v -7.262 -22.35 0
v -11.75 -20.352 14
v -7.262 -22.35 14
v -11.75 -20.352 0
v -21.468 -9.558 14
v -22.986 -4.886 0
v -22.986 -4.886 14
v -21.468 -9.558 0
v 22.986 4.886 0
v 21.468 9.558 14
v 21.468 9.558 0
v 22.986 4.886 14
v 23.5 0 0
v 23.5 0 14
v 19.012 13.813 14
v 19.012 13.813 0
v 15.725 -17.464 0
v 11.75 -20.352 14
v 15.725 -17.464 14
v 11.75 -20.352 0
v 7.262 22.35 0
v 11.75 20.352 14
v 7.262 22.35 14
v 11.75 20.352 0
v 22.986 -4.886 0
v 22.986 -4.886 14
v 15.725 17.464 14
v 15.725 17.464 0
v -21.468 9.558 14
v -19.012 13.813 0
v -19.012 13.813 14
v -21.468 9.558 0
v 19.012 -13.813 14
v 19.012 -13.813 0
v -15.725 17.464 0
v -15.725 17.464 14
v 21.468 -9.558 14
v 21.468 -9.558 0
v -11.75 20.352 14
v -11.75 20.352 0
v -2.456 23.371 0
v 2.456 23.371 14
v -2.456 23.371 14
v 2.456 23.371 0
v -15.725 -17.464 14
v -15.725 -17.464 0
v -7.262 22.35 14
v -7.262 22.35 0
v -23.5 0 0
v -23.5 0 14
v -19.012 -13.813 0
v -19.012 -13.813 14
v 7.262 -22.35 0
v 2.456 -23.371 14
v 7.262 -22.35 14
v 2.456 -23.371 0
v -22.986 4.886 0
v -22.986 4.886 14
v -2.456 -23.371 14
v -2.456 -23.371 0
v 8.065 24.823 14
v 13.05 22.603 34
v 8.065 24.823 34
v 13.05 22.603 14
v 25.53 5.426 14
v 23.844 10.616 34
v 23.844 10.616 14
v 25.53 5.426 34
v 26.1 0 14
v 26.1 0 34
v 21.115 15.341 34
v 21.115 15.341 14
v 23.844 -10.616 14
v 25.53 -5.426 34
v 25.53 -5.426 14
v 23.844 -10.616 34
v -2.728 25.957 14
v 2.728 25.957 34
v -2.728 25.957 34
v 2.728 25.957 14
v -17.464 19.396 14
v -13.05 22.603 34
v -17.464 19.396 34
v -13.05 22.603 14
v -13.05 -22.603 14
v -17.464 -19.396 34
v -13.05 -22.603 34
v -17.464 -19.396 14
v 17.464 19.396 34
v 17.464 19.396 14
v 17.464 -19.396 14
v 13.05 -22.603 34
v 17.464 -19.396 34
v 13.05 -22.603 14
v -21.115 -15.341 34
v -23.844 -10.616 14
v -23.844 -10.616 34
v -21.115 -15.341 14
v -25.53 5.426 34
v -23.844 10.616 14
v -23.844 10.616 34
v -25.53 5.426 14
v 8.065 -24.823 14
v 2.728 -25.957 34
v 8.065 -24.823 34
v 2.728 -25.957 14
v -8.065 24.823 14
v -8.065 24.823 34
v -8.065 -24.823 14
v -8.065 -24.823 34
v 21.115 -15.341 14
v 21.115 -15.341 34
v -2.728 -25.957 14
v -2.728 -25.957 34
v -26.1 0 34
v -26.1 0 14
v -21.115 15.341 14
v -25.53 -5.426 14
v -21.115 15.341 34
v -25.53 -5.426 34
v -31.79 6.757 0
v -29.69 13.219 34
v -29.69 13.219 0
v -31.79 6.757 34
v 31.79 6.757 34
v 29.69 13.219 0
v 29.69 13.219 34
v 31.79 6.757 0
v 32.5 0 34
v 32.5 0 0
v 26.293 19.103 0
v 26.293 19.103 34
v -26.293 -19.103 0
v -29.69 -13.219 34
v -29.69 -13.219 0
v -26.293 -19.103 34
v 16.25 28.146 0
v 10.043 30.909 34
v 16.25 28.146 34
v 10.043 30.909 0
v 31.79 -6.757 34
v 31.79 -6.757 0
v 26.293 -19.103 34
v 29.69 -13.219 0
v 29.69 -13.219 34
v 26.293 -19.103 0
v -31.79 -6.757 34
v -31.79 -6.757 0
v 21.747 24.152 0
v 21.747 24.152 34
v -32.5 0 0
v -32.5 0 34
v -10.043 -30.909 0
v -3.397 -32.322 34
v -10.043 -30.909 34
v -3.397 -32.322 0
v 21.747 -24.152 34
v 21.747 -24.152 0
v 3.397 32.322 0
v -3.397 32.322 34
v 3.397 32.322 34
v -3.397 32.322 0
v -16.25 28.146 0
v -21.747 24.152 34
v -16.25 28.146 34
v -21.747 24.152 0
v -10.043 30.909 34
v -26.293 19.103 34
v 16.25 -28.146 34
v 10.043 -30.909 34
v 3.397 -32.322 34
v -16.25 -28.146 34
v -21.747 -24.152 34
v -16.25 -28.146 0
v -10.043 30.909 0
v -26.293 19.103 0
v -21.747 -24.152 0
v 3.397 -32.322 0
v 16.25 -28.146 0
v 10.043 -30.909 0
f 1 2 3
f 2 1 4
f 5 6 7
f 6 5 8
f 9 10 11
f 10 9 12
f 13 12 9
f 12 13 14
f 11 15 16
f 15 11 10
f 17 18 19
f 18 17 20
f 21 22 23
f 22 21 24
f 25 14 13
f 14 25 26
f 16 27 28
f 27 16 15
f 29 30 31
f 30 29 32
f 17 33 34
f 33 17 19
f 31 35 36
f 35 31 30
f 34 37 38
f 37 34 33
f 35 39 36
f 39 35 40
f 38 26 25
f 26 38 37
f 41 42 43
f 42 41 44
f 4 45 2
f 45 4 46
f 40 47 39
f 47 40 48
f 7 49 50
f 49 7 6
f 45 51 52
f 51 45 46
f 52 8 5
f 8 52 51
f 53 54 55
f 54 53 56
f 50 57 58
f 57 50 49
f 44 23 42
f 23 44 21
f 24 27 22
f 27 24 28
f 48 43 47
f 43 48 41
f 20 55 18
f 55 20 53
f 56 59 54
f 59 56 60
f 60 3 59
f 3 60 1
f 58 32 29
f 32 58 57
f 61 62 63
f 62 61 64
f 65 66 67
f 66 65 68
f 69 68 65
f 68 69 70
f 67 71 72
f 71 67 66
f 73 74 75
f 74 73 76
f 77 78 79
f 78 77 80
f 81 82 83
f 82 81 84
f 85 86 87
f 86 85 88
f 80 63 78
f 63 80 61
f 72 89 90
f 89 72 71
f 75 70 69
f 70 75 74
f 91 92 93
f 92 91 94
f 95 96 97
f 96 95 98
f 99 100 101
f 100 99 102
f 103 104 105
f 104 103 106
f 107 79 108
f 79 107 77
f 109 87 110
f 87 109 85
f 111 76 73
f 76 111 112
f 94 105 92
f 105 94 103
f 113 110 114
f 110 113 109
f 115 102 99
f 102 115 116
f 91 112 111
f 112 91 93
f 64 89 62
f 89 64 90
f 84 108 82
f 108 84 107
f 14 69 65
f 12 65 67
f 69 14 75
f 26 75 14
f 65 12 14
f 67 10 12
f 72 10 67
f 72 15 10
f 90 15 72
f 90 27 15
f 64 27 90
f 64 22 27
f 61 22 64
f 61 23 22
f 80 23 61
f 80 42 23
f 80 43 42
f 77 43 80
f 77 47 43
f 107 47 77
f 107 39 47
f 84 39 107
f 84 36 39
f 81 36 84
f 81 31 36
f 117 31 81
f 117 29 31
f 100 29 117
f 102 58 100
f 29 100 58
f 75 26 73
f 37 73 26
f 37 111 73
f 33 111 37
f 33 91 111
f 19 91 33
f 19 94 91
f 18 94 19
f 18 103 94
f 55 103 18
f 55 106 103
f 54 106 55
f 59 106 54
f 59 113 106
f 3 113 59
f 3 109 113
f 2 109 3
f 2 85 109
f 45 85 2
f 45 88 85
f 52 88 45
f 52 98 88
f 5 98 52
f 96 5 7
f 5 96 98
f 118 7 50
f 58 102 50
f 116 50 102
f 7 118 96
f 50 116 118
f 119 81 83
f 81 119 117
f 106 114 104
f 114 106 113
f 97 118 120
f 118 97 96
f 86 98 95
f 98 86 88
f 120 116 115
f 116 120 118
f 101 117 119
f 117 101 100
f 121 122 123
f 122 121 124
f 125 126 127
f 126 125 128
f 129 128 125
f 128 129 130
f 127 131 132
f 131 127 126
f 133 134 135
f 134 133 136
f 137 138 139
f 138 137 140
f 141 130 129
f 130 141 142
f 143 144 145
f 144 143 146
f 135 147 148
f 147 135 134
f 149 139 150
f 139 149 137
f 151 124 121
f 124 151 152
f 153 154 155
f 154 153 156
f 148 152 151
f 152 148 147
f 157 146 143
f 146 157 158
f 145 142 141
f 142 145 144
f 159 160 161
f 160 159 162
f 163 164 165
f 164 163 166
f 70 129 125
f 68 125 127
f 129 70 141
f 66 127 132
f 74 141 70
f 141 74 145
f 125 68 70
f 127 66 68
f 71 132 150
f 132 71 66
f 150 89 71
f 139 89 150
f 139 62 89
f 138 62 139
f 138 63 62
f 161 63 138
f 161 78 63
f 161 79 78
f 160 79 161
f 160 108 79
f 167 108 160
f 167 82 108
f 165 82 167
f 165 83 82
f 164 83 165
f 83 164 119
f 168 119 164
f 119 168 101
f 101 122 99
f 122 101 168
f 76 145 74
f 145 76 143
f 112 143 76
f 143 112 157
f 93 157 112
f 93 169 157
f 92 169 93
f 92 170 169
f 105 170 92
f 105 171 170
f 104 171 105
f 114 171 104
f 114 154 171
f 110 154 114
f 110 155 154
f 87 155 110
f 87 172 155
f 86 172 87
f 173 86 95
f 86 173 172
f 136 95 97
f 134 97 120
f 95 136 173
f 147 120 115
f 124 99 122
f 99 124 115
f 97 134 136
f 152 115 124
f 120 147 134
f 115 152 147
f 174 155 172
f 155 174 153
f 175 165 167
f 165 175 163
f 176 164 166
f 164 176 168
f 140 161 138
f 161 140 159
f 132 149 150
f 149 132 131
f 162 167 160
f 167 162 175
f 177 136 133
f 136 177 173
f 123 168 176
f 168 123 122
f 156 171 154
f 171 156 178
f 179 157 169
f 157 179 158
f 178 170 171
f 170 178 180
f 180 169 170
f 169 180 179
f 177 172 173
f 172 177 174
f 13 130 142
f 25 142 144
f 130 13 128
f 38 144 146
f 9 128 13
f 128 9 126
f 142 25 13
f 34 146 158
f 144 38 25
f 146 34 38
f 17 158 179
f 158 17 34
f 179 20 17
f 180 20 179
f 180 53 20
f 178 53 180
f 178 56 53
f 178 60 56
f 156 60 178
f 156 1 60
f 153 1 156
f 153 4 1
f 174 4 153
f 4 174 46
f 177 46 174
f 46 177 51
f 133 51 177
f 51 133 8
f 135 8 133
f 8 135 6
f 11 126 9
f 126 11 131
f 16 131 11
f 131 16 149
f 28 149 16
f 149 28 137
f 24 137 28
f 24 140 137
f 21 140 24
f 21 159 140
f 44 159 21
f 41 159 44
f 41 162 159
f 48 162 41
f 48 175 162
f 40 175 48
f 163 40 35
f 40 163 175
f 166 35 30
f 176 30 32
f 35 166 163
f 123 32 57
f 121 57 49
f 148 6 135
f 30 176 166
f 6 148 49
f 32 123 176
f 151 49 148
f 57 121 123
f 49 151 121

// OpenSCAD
// file: verticalShaftHolderPivotPoint.scad
include <parameters/commonParameters.scad>;
include <parameters/verticalShaftHolderParameters.scad>;
// Example part to sit on the verticalShaftHolder
// including holding a roller bearing

// The bottom should be no narrower than thrustBearingMinimumAbutmentDiameter,
// But it can be much bigger.

// The idea is that sits ON the thrust bearing, and holds a roller bearing to minimize friction around the center shaft,
// for times when there is angular stress on the system.

module verticalShaftHolderPivotPoint(outsideDiameter = thrustBearingMinimumAbutmentDiameter, rollerBearingHeightAboveThrustBearing = thrustBearingHeight) {
    difference() {
        // Height and width of this part are minimums.
        echo(rollerBearingHeightAboveThrustBearing + rollerBearingHeight);
        cylinder(h = rollerBearingHeightAboveThrustBearing + rollerBearingHeight, d =
        outsideDiameter);
        union() {
            translate([0, 0, - 1]) // -1 just ensures we clear the bottom and don't leave a 2d "film"
                cylinder(h = 200, d = thrustBearingOuterDiameterShaftWasher);
            translate([0, 0, rollerBearingHeightAboveThrustBearing])
                cylinder(h = 200, d = rollerBearingOutsideDiameter);
        }
    }
}

// Remember that the thrust bearing fits between these two parts,
// In theory one could "encapsulate" it, but remember the top and bottom
// of the thrust washer have the same outside diameter, so you can't "squeeze" it.
// In theory the INSIDE of this part should hold everything in place.

// The only possible "slop" is that the roller ball carrier and the top of the thrust bearing could "rattle" a little, but I think that the groove in the top and bottom pieces
// will center it rapidly.
// Not to mention pinning it relatively tighly will prevent it "poppping out".

// If that is an issue though, we could "capture" or "squeeze" the top "washer"
// of the thrust bearing.

// The MINIMUM outside diameter is thrustBearingMinimumAbutmentDiameter,
// which is the default if no argument is given,
// But to fully use the entire surface of the thrust washer use thrustBearingOutsideDiameter
verticalShaftHolderPivotPoint(outsideDiameter = thrustBearingOutsideDiameter);
// file: modules/legsAroundTheCenterPoint.scad
include <jointModule.scad>;

module legsAroundTheCenterPoint(legCount = 1, legLength = false, includeTriangleSupports = true) {
    legSpacingInDegrees = 360 / legCount;

    // TODO: Triangle parameters should be arguments to the function.
    //       and/or use some fancy math to generate.
    jointLegs = [for (i = [0:legCount - 1]) legInstance(rotation = [0, 90, legSpacingInDegrees * i], insideDiameter =
    horizontalPipeInsideDiameter,
    flatBottom = true, pinHole = true, length = legLength, triangleSupport = includeTriangleSupports ? [15, - 21 + legSpacingInDegrees * i, 50] : false)];
    joint(jointLegs, horizontalPipeInsideDiameter, true);
}
// file: modules/jointModule.scad
// Modules
// legs is a vector of legs,
//      each leg is a vector containing:
//      vector of the joint rotation
// horizontalPipeInsideDiameter
// Optional Boolean requesting addition of a flat bottom
// Optional Boolean or number requesting a hole drilled near the end,
//      If it is a number, this is the angle at which it should be drilled.
//      For historical reasons, 0 and true are equivalent
//      Use false when you need to skip this but still add another vector entry
// Option integer indicating an override for the length of this leg
// i.e. [[x, y, z], horizontalPipeInsideDiameter]

/*
i.e.
jointLegs = [
        [[0, 90, 0], horizontalPipeInsideDiameter, true, true],
        [[90, 90, 0], horizontalPipeInsideDiameter, true, 45],
        [[90, 90, 180], horizontalPipeInsideDiameter, true, 90, 500],
    ];

 */

// This function makes creating the array for the joint module much easier.
// Just name any parameters and skip those you don't care about and defaults will be injected.
// The only REQUIRED paremeter is the insideDiameter, although a suitable default could be added here (instead of 0, so technically it isn't required).
function legInstance(rotation = [0, 0, 0], insideDiameter = 0, flatBottom = false, pinHole = false, length = false,
triangleSupport = false, labelText = false, reverseText = false) = [rotation,
  insideDiameter, flatBottom, pinHole, length, triangleSupport, labelText, reverseText];

// Pinholes have to be further from the ends because the ends are cut off to fit in the print bed.
module joint(legs = [], sphereJointInsideDiameter = 0, closeUpWithSphere = false, addCircleToFlatBottom = false, jointPinHoleOffset = jointPinHoleOffset)
{
  difference()
    {
      // Build
      union() color(JointColor)
        {
          for (leg = legs) {
            thisJointLegLength = len(leg) > 4 && leg[4] != false ? leg[4] : jointLegLength;
            rotate(leg[0])
              cylinder(
              h = thisJointLegLength,
              r = (leg[1] + jointWallThickness * 2) / 2);

            // Add flat bottom
            if (leg[2]) {
              rotate(leg[0])
                translate([
                    (leg[1] / 2) + (jointWallThickness / 2),
                  0,
                    thisJointLegLength / 2
                  ])
                  cube([
                    jointWallThickness,
                    // The 0.5 is a guess at width. A parameter would probably be better.
                      leg[1] * 0.5,
                    thisJointLegLength
                    ],
                  center = true);
            }

            // Triangles for improving stength
            if (len(leg) > 5 && leg[5] != false) {

              // TODO: Document this
              thisTrianglePointA = leg[5][0] ? leg[5][0] : 10;
              thisTriangleRotateZ = leg[5][1] ? leg[5][1] : leg[0][2] * 1.5;
              thisTrianglePointB = leg[5][2] ? leg[5][2] : 40;
              thisTriangleRotatex = leg[5][3] ? leg[5][3] : 90 - leg[0][1];
              thisTriangleRotateY = leg[5][4] ? leg[5][4] : 0;

              rotate([thisTriangleRotatex, thisTriangleRotateY, thisTriangleRotateZ])
                linear_extrude(height = 8, center = true, convexity = 10, twist = 0)
                  polygon(points = [[thisTrianglePointA, thisTrianglePointB], [0, 0], [
                    thisTrianglePointB, thisTrianglePointA]],
                  paths =
                    [[0, 1, 2]]);
            }
          }

          if (closeUpWithSphere)
          // Use a Sphere to close up the gap between the pipes.
          // This is kinda hacky, but it looks good to me and does the job.
            sphere(d = sphereJointInsideDiameter + jointWallThickness * 2);

          if (addCircleToFlatBottom)
          // Add a cylinder at the end of the leg to close any gap between leg flats
          // This also creates a solid floor in case the sphere is so big
          // that the cut below cuts off the bottom of it.
            rotate(legs[0][0])
              rotate([0, 90, 0])
                translate([
                  0,
                  0,
                    legs[0][1] / 2,
                  ])
                  cylinder(h = jointWallThickness, r = (legs[0][1] * 0.5) / 2);

        }

      // Hollow out
      union()
        {
          for (leg = legs) {
            thisJointLegLength = len(leg) > 4 && leg[4] != false ? leg[4] : jointLegLength;
            // The -0.01 ensures that the end of the tube is clear.
            rotate(leg[0]) translate([0, 0, - 0.01]) cylinder(
            h = thisJointLegLength + 0.02, r = leg[1] / 2);

            // IF a flat bottom was added, also add a "cut" to ensure nothing
            // else in the part extends below this flat bottom.
            if (leg[2]) {
              rotate(leg[0])
                translate([
                    (leg[1] / 2) + (jointWallThickness * 2),
                  0,
                    thisJointLegLength / 2
                  ])
                  cube([
                    // The 0.00001 just ensures it doesn't clip the flat on the legs at all.
                        jointWallThickness * 2 - 0.00001,
                      leg[1] * 2,
                      thisJointLegLength * 2
                    ],
                  center = true);
            }
            if (len(leg) > 3 && leg[3] != false) {
              // Make a hole near the end of the leg for pinning
              // The -0.01 ensures that the end of the tube is clear.
              rotate([leg[0][0] + 90, leg[0][1], leg[0][2]])
                translate([0,
                    thisJointLegLength - jointPinHoleOffset, 0])
                  rotate([0, leg[3] == true ? 0 : leg[3],
                    0])
                    cylinder(
                    h = leg[1] + jointWallThickness * 2 + 0.01, d = jointPinningHoleDiameter, center
                    = true);
            }
            // Add text to bottom of a flat leg
            if (len(leg) > 6 && leg[6] != false) {
              rotate([leg[0][0], leg[0][1] + 90, leg[0][2]])
                translate([
                      - thisJointLegLength + jointPinHoleOffset + jointPinningHoleDiameter
                  ,
                  0,
                        sphereJointInsideDiameter / 2 + jointWallThickness - 1
                  ])
                  mirror([0, leg[7] == true ? 1 : 0, 0])
                    linear_extrude(1.1)
                      text(leg[6], size = 5, font = "Liberation Mono", valign = "center", halign =
                      "left");
            }
          }

          if (closeUpWithSphere) {
            // Hollow out the sphere
            sphere(d = sphereJointInsideDiameter);
          }

        }
    }
}
// file: parameters/verticalShaftHolderParameters.scad
// https://paper.dropbox.com/doc/Shaft-Holder-with-Bearings--BPUd0R93dqpLMge3XfPWzi2zAg-a79LjXcU3vrNJJHZMteSG

rollerBearingInsideDiameter = 45; // Same as Thrust Bearing bore diameter
rollerBearingHeight = 20;
rollerBearingOutsideDiameter = 52.2;

thrustBearingOutsideDiameter = 65;
thrustBearingHeight = 14;
thrustBearingOuterDiameterShaftWasher = 47;

thrustBearingMinimumAbutmentDiameter = 57; // This is a MINIMUM

comfortablePinningDiameter = 55; // Could maybe be bigger?
comfortablePinnedSectionHeight = 20; // May need testing
// file: WalkerBody-BoxCornerJoint-withX.scad
// Load in some defaults
include <parameters/commonParameters.scad>;

// Pick what size pipes you are using
horizontalPipeInsideDiameter = horizontalPipeInsideDiameter_0_50pvc;
verticalPipeInsideDiameter = verticalPipeInsideDiameter_0_50pvc;

include <modules/jointModule.scad>;

module BoxCornerJoint()
{
    jointLegs = [
        legInstance(rotation = [0, 90, 0], insideDiameter = horizontalPipeInsideDiameter, flatBottom = true, pinHole =
        true, length = jointLegLength + 25),
        legInstance(rotation = [45, 90, 0], insideDiameter = horizontalPipeInsideDiameter, flatBottom = true, pinHole =
        true, length = jointLegLength + 50),
        legInstance(rotation = [90, 90, 0], insideDiameter = horizontalPipeInsideDiameter, flatBottom = true, pinHole =
        true, length = jointLegLength + 25, triangleSupport = [10, -90, 60]),
        // Upright
        legInstance(insideDiameter = verticalPipeInsideDiameter, pinHole = true, triangleSupport = [10, - 45, 40]),
        ];

    rotate([0, 0, 180]) joint(jointLegs, horizontalPipeInsideDiameter, true);
}

//BoxCornerJoint();
// file: WalkerBody-Lower-CenterShaftRotationPoint.scad
include <parameters/commonParameters.scad>;
include <parameters/verticalShaftHolderParameters.scad>;

// Pick what size pipes you are using
horizontalPipeInsideDiameter = horizontalPipeInsideDiameter_0_50pvc;
shaftPipeInsideDiameter = verticalPipeInsideDiameter_1_25pvc;

include <modules/jointModule.scad>;
include <modules/legsAroundTheCenterPoint.scad>;
include <verticalShaftHolderPivotPoint.scad>;

// TODO: Should this part incorporate the batteryholder?
// TODO: This part needs to accomodate a thrust bearing on top and a pinned piece above it.

module WalkerBodyLowerCenterShaftRotationPoint() {
    difference()
        {
            union()
                {
                    legsAroundTheCenterPoint(legCount = 4, legLength = 80, includeTriangleSupports = false);

                    // Extra triangle supports
                    horizontalSupportTriangleSize = 40;
                    trianglePositions = [0, 90, 180, 270];
                    for(trianglePosition = trianglePositions) {
                        rotate([0, 270, trianglePosition])
                            translate([12, 30, 0])
                                linear_extrude(height = 8, center = true, convexity = 10, twist = 0)
                                    polygon(points = [[horizontalSupportTriangleSize, 0], [0, 0], [0,
                                        horizontalSupportTriangleSize]],
                                    paths =
                                        [[0, 1, 2]]);
                    }
                }
            union()
                {
                    // The -0.01 ensures that the end of the tube is clear.
                    translate([0, 0, - 100])
                        cylinder(h = 200, d = thrustBearingOutsideDiameter);
                }
        }

    translate([0, 0, - horizontalPipeInsideDiameter / 2 - jointWallThickness])
        verticalShaftHolderPivotPoint(outsideDiameter = thrustBearingOutsideDiameter, rollerBearingHeightAboveThrustBearing = walkerBodyLowerShaftHolderRollerBearingHeightAboveThrustBearing);
}

//WalkerBodyLowerCenterShaftRotationPoint();
// file: parameters/commonParameters.scad
// All measurements in millimeters

// "horizontal" and "vertical" refer to how they are printed on the print bed,
// not how they work on the final assembly.
// ALWAYS print verticle pipes straight up if possible, that is 90 degrees from the bed.
// Attempting to print a slanted pipe will be troublesome and require testing for a proper size.
// However, you can print ANY angle ON the bed.

// 1.25" PVC Pipe:
horizontalPipeInsideDiameter_1_25pvc = 42.9;
verticalPipeInsideDiameter_1_25pvc = 42.5;

// 0.5" PVC Pipe:
horizontalPipeInsideDiameter_0_50pvc = 22.1;
verticalPipeInsideDiameter_0_50pvc = 21.7;

// Parameters
jointLegLength = 50;
jointWallThickness = 3.5;
jointPinningHoleDiameter = 7;
jointPinHoleOffset = 10;

// Walker Foot Parameters
inchesToMmConversionFactor = 25.4;

// Current idea is 11 x 21 inches.
walkerFootHeight = 11 * inchesToMmConversionFactor;
walkerFootLength = 21 * inchesToMmConversionFactor;
// Back of Foot is 4 inches longer to cause foot to hang AND LOOK as desired
// I tried 1 inch and it had basically NO affect on how it hangs.
// I think it looks cool at 4 inches, so I am going to test that.
// I *THINK* that it actually doesn't affect lenght of the walker, because the front
// of one compensates for the back of the other.
walkerFootCenterOffset = 0 * inchesToMmConversionFactor; // Remember to multiply any offset by the conversion factor.
walkerFootFrontLength = (walkerFootLength / 2) - (walkerFootCenterOffset / 2);
walkerFootBackLength = (walkerFootLength / 2) + (walkerFootCenterOffset / 2);

footLowerJointLegLength = 75;

// Angles
// This site is great for visualizing what you want: https://www.blocklayer.com/trig/scaleneeng.aspx
// Use this site to check your math and results: https://www.calculator.net/right-triangle-calculator.html
//echo("=======================================================");
//echo("Walker Foot Parameters");
//echo("walkerFootLength", walkerFootLength, walkerFootFrontLength + walkerFootBackLength);
//echo("=======================================================");
//echo("Front:");
//echo("walkerFootHeight (a)", walkerFootHeight);
//echo("walkerFootFrontLength (b)", walkerFootFrontLength);
//walkerFootFrontTriangleTopLength = sqrt(pow(walkerFootHeight, 2) + pow(walkerFootFrontLength, 2));
//echo("walkerFootFrontTriangleTopLength (c)", walkerFootFrontTriangleTopLength);
//walkerFootFrontJointAngle = asin(walkerFootHeight / walkerFootFrontTriangleTopLength);
//echo("walkerFootFrontJointAngle (α):", walkerFootFrontJointAngle);
//walkerAnkleFrontAngle = asin(walkerFootFrontLength / walkerFootFrontTriangleTopLength);
//echo("walkerAnkleFrontAngle (β)", walkerAnkleFrontAngle);
//echo("-------------------------------------------------------");
//echo("Back");
//echo("walkerFootBackLength (b)", walkerFootBackLength);
//walkerFootBackTriangleTopLength = sqrt(pow(walkerFootHeight, 2) + pow(walkerFootBackLength, 2));
//echo("walkerFootBackTriangleTopLength (c)", walkerFootBackTriangleTopLength);
//walkerFootBackJointAngle = asin(walkerFootHeight / walkerFootBackTriangleTopLength);
//echo("walkerFootBackJointAngle (α):", walkerFootBackJointAngle);
//walkerAnkleBackAngle = asin(walkerFootBackLength / walkerFootBackTriangleTopLength);
//echo("walkerAnkleBackAngle (β)", walkerAnkleBackAngle);
//echo("=======================================================");



// This height is purely based on giving space for nice triangles supports.
// It could be shorter, just be sure to adjust the triangles.
walkerBodyLowerShaftHolderRollerBearingHeightAboveThrustBearing = 50;

// 12v Battery Box
batteryHolderWallThickness = 5;

// Battery Dimensions
// https://www.power-sonic.com/product/ps-1290/
batteryHeight = 94;
batteryWidth = 65.6; // Ben uses 65.6, Web Site says 65
batteryLength = 150.6; // Ben uses 150.6, Web site says 141
batteryBoxDepth = 60; // This is arbitrary. Ben uses 60 for the Dalek

// Colors
JointColor = "CornflowerBlue";
PipeColor = "Pink";

// Resoution
// This is perfect for 3D Printing,
// but you may want to comment it out while working to improve preview
// performance
//$fa = 1;
//$fs = 0.4;
// Although this makes it VERY high rez, which might be better for the slicer? Experimenting with it instead.
// NOTE that using $fn causes FreeCAD and hence .step files exported to Fusion 360 to show round items as a series of faces instead of a single object.
//$fn = 500;
// main file
include <parameters/commonParameters.scad>;

include <WalkerBody-Lower-CenterShaftRotationPoint.scad>

include <WalkerBody-BoxCornerJoint-withX.scad>

walkerBoxSideCount = 4;
walkerBoxWidth = 32 * inchesToMmConversionFactor;

// Angles
// This site is great for visualizing what you want: https://www.blocklayer.com/trig/scaleneeng.aspx
// Use this site to check your math and results: https://www.calculator.net/right-triangle-calculator.html
echo("=======================================================");
echo("Walker Box Parameters");
echo("walkerBoxWidth", walkerBoxWidth);
echo("=======================================================");
echo("Diagonal:");
echo("walkerBoxWidth (a)", walkerBoxWidth);
echo("walkerBoxWidth (b)", walkerBoxWidth);
walkerBoxDiagonalLength = sqrt(pow(walkerBoxWidth, 2) + pow(walkerBoxWidth, 2));
echo("walkerBoxDiagonalLength (c)", walkerBoxDiagonalLength);
echo("=======================================================");

walkerBoxSideSpacingInDegrees = 360 / walkerBoxSideCount;

module WalkerBodyFullAssembly() {
    WalkerBodyLowerCenterShaftRotationPoint();

    for (i = [0:walkerBoxSideCount - 1]) {
        // Lower BoxCornerJoints
        rotate([0, 0, walkerBoxSideSpacingInDegrees * i])
            translate([0, walkerBoxDiagonalLength / 2, 0])
                rotate([0, 0, walkerBoxSideSpacingInDegrees * 1.5])
                    BoxCornerJoint();

        // Bottom Cross pieces
        color(PipeColor)
            rotate([90, 0, walkerBoxSideSpacingInDegrees * i])
                cylinder(h = walkerBoxDiagonalLength / 2, r = verticalPipeInsideDiameter_0_50pvc / 2);

        // Bottom Outside Parimiter
        color(PipeColor)
            rotate([90, 0, walkerBoxSideSpacingInDegrees * i])
                translate([walkerBoxDiagonalLength / 2, 0, 0])
                    rotate([0, - walkerBoxSideSpacingInDegrees / 2, 0])
                        cylinder(h = walkerBoxWidth, r = verticalPipeInsideDiameter_0_50pvc / 2);
    }
}
